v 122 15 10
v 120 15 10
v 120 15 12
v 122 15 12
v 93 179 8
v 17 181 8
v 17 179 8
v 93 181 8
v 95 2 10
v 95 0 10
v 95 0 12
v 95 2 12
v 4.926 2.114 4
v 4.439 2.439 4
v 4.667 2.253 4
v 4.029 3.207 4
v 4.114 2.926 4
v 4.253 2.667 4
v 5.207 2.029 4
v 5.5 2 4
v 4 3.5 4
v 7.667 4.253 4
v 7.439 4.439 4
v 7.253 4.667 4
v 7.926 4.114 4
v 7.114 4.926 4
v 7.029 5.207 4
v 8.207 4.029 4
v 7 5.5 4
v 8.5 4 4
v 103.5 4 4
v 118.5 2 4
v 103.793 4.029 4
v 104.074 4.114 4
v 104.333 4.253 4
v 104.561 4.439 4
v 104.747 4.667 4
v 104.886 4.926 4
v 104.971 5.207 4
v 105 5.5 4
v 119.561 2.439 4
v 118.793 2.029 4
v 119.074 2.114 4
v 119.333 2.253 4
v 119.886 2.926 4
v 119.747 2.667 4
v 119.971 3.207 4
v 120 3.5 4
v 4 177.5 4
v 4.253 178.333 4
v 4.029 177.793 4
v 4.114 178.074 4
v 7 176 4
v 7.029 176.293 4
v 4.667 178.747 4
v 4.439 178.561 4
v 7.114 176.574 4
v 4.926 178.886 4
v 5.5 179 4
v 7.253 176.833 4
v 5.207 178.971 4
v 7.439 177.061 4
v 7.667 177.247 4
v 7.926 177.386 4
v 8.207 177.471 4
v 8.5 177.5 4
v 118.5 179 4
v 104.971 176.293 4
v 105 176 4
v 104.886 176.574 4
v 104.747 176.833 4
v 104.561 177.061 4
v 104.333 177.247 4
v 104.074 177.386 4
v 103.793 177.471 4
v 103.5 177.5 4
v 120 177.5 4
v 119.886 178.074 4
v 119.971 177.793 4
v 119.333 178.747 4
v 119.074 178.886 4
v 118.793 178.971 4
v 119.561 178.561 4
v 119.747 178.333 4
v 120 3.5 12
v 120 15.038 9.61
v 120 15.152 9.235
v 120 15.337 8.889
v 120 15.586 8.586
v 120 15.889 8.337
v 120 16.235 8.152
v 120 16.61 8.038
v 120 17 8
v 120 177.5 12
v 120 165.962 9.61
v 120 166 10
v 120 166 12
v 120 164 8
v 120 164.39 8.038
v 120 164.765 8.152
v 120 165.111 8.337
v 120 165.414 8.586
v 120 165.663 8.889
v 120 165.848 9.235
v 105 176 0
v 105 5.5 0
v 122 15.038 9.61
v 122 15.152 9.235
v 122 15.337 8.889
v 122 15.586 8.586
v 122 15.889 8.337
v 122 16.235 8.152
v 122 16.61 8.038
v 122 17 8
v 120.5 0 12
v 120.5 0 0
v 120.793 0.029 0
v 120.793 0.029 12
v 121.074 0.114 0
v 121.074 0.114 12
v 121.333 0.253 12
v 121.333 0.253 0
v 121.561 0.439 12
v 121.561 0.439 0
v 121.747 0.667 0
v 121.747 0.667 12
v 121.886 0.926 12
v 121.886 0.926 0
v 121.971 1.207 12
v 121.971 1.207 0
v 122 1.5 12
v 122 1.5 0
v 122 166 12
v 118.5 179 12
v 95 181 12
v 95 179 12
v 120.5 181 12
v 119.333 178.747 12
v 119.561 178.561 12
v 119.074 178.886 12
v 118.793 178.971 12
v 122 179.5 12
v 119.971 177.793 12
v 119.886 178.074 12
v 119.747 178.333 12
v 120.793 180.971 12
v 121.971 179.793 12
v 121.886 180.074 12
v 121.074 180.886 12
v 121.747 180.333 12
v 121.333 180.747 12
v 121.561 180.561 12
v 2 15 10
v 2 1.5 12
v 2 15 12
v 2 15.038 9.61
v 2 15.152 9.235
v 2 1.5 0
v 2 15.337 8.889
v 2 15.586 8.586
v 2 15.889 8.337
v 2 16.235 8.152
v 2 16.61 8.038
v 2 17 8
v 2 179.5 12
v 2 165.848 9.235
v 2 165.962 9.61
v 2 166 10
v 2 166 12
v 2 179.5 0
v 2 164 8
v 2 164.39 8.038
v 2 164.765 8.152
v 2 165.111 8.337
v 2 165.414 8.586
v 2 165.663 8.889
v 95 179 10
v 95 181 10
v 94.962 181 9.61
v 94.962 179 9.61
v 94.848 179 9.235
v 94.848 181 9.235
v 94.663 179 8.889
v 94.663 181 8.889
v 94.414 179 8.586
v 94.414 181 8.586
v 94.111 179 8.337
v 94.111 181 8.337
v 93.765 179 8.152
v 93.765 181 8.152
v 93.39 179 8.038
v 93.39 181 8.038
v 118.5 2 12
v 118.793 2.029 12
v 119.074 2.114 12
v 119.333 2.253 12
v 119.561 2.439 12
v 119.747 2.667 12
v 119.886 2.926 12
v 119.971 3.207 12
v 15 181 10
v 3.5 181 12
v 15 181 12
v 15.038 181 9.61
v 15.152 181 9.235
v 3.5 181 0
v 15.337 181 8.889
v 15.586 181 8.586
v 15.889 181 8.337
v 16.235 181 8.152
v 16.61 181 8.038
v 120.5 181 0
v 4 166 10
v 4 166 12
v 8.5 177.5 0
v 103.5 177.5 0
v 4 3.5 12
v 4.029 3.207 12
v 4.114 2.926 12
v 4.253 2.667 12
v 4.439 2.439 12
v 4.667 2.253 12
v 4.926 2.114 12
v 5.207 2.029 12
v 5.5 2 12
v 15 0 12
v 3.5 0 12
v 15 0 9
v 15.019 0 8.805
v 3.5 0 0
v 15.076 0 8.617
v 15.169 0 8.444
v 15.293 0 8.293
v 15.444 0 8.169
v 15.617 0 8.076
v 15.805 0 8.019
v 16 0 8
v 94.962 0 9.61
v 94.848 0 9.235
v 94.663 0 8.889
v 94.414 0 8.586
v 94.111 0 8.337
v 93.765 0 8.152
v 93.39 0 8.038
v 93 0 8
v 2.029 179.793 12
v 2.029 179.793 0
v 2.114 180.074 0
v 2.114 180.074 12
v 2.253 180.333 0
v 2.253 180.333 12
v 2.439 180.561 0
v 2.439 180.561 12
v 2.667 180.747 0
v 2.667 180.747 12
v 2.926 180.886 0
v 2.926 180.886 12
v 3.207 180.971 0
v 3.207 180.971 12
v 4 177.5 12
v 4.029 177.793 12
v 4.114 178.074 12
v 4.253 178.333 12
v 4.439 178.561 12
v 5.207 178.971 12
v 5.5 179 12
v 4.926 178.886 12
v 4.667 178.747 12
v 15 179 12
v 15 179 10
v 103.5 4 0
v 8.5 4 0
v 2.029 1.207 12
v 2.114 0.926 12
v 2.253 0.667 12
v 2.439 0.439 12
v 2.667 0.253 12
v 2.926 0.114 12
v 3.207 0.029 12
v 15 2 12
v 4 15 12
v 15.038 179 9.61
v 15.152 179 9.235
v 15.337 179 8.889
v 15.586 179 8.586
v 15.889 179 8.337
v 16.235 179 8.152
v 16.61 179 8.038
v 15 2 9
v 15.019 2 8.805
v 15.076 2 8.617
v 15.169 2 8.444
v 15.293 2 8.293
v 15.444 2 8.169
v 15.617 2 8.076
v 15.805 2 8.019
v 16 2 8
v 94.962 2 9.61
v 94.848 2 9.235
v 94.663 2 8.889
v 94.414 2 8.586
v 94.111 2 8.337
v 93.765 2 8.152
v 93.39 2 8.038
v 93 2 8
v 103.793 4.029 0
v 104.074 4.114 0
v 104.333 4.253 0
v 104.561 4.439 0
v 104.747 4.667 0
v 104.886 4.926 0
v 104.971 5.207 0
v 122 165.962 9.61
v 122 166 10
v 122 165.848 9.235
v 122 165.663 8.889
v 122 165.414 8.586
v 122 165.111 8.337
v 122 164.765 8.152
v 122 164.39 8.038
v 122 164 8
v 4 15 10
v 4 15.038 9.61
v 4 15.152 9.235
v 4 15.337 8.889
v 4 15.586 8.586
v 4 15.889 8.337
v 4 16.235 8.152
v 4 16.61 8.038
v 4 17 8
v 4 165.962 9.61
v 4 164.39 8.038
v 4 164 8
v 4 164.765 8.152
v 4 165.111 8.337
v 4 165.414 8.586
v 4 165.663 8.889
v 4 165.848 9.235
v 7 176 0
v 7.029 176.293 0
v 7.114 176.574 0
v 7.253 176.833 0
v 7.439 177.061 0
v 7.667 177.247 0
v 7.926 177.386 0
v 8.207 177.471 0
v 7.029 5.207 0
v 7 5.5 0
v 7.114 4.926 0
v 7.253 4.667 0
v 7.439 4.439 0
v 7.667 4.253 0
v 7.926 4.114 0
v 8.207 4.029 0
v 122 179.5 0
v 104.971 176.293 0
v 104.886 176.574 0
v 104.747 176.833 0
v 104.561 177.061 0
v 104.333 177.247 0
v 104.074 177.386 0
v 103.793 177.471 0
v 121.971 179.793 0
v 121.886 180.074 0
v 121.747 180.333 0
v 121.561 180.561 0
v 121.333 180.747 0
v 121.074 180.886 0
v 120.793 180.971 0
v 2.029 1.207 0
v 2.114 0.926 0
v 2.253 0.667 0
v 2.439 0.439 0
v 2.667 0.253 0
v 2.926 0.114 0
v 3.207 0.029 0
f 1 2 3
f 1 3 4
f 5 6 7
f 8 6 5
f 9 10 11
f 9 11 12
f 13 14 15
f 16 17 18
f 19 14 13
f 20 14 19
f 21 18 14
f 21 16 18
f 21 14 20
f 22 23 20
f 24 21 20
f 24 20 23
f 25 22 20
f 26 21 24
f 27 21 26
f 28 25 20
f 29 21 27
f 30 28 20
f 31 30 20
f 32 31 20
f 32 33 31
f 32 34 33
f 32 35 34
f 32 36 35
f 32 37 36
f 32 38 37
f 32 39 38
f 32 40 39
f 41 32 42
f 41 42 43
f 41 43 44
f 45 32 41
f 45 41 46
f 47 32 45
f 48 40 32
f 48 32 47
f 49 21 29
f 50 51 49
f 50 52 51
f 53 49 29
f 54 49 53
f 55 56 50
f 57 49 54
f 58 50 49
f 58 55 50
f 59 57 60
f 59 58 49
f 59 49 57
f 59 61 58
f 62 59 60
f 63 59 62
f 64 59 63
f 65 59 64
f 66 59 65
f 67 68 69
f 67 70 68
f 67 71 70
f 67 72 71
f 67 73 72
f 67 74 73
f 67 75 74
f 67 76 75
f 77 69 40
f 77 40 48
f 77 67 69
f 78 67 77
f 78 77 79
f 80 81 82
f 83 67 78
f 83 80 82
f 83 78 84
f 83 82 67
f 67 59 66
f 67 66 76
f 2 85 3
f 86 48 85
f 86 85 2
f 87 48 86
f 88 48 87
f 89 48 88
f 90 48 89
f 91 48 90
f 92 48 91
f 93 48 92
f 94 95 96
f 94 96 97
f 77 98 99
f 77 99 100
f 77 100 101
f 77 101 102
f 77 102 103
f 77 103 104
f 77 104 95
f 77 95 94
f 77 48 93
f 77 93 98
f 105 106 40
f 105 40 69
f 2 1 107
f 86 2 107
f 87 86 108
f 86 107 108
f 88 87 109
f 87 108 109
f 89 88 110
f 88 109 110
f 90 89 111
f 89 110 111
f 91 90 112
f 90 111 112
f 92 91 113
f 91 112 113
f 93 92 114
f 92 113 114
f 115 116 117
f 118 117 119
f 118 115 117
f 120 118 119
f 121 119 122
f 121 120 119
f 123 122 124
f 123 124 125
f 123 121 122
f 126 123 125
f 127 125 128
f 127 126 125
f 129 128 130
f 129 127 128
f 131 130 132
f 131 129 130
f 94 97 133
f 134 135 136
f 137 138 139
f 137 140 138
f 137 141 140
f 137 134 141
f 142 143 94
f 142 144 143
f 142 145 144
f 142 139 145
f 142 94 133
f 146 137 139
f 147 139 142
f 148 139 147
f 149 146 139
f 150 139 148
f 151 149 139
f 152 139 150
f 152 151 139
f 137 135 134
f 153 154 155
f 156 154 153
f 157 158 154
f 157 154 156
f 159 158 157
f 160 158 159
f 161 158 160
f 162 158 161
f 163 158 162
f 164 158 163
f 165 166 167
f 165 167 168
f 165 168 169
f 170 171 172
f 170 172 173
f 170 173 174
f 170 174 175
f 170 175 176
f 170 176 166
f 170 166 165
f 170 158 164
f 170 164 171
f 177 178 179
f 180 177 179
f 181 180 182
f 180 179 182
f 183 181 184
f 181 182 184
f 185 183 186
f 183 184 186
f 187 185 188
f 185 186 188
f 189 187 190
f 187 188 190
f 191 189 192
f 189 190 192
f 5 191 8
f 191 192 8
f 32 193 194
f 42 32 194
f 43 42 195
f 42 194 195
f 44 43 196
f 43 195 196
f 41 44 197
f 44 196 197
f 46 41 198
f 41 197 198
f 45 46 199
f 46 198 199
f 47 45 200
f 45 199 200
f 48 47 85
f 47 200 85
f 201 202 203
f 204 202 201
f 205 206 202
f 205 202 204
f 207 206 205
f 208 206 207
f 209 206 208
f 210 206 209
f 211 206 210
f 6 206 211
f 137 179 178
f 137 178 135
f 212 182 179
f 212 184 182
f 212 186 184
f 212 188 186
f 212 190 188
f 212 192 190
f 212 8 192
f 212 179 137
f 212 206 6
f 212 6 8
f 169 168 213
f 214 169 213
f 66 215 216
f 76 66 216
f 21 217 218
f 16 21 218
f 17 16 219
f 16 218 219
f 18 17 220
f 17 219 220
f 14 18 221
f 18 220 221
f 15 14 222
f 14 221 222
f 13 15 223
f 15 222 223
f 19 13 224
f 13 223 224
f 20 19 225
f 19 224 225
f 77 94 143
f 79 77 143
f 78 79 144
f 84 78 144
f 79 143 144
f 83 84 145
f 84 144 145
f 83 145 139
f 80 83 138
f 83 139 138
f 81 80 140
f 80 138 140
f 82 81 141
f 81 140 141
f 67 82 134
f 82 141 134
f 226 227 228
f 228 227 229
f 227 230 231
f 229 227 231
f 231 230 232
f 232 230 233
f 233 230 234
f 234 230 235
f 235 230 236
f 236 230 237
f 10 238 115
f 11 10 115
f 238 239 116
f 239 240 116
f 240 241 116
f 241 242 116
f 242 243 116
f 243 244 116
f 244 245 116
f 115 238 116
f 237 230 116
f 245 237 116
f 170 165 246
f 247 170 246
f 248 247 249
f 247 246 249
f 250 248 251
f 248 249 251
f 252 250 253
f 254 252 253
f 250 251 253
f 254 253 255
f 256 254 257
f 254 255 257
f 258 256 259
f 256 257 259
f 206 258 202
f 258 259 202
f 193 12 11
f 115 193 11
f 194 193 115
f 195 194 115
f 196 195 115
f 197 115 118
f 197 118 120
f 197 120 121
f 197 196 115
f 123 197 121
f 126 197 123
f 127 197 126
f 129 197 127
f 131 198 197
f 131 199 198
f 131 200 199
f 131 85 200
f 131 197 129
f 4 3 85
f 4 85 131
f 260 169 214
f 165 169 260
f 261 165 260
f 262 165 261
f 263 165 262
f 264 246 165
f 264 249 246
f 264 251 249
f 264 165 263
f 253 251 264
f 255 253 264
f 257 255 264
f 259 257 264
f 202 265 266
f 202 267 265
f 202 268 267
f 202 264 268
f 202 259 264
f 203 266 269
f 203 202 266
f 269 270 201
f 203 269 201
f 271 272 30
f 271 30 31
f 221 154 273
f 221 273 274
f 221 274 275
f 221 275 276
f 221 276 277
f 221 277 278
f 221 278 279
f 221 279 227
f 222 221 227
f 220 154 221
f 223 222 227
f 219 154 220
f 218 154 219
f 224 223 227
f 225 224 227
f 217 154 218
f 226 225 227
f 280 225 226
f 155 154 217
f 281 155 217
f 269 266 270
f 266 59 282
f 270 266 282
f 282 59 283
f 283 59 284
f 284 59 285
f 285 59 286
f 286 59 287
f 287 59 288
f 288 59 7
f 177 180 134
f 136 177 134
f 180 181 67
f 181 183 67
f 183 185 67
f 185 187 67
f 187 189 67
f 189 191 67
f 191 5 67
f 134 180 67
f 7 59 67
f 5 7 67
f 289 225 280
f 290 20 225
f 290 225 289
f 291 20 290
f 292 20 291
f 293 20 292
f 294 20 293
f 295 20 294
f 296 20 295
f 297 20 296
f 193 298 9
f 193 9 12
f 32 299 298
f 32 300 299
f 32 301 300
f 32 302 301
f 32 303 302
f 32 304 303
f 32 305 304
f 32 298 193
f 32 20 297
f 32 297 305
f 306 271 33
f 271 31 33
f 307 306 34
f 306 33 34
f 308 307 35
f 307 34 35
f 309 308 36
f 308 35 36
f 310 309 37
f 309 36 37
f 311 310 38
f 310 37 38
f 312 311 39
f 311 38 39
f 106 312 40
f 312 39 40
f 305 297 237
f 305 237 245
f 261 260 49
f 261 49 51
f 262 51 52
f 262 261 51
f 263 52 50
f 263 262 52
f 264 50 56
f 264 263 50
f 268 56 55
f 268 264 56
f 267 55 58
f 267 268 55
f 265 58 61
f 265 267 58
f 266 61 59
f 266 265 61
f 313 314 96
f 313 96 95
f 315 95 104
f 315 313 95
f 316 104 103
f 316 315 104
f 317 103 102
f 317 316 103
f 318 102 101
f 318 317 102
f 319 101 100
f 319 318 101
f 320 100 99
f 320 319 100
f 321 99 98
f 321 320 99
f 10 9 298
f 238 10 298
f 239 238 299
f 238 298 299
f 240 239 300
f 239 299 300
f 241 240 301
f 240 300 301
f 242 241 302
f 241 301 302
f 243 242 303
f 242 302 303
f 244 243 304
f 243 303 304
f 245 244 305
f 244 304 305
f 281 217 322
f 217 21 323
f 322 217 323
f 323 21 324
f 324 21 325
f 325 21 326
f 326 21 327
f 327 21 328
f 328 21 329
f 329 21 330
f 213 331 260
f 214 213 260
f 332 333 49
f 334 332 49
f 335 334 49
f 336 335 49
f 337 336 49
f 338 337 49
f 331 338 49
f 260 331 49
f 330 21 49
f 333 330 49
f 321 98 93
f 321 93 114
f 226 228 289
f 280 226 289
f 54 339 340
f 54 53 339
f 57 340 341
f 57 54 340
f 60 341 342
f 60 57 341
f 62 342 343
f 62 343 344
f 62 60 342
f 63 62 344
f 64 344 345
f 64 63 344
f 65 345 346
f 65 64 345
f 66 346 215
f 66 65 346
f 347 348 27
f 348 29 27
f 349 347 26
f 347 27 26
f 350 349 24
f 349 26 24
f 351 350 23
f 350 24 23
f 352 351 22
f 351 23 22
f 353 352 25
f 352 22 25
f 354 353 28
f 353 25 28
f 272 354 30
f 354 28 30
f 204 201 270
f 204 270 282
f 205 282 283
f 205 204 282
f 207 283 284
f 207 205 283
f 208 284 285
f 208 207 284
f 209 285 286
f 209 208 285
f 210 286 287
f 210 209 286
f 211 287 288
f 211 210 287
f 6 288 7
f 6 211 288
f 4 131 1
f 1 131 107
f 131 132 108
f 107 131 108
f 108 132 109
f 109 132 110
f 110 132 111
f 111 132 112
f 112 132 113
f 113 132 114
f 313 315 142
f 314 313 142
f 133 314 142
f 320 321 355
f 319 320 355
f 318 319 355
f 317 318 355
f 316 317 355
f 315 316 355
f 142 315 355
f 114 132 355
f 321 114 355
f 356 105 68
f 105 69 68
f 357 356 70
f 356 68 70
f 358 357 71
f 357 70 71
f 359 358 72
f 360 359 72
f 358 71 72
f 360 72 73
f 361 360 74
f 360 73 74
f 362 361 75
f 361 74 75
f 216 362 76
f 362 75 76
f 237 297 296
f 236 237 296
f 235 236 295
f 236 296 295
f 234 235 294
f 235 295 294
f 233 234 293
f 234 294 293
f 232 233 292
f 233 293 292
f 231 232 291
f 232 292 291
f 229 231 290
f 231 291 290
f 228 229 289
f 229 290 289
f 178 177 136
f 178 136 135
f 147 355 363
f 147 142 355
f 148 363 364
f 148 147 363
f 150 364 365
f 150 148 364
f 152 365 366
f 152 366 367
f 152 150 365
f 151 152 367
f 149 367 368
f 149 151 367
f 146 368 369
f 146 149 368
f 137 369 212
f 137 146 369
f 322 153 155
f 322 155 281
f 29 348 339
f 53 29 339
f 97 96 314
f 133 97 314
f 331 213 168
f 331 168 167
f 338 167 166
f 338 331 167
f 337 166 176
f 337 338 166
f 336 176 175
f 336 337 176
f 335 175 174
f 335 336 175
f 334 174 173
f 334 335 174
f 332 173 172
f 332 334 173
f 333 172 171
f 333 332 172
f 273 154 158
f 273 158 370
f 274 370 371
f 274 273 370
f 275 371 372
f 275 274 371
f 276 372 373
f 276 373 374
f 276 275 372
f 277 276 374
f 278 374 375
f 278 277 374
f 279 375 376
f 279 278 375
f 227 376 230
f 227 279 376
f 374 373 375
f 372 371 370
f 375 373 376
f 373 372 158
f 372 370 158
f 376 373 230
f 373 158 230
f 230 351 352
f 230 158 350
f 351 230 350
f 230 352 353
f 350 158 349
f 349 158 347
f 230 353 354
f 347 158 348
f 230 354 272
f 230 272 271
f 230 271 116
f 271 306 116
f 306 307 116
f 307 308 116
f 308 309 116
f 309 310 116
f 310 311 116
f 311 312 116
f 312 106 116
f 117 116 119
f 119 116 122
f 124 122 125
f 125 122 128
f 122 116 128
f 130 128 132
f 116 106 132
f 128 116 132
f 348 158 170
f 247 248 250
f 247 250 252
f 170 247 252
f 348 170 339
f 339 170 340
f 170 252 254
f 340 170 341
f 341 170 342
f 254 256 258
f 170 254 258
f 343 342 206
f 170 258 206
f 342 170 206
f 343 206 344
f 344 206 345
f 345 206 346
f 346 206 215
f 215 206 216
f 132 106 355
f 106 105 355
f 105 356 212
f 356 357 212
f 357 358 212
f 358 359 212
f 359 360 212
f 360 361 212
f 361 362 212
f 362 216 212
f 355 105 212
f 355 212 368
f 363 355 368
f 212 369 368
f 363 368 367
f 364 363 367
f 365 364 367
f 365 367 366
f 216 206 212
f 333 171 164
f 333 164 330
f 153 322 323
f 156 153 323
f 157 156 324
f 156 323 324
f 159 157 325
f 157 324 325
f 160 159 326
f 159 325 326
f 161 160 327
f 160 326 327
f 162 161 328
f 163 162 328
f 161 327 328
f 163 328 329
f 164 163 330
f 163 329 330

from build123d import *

# Parameters (mm, degrees)
BOX004_W      = 10
BOX004_H      = 151
BOX004_DEPTH  = 10
BOX006_W      = 80
BOX006_H      = 10
BOX006_DEPTH  = 10
BOX005_W      = 10
BOX005_H      = 151
BOX005_DEPTH  = 10
BOX007_W      = 80
BOX007_H      = 10
BOX007_DEPTH  = 10
FILLET004_1_R = 2
FILLET004_2_R = 1
BOX003_W      = 116
BOX003_H      = 177
BOX003_DEPTH  = 10
FILLET002_R   = 1.5
BOX002_W      = 120
BOX002_H      = 181
BOX002_DEPTH  = 8
FILLET003_R   = 1.5
BOX001_W      = 98
BOX001_H      = 173.5
BOX001_DEPTH  = 4
FILLET_R      = 1.5
BOX_W         = 120
BOX_H         = 181
BOX_DEPTH     = 4
FILLET001_R   = 1.5


with BuildPart() as cube004:
    # Box004 → Box004 (new body)
    with BuildSketch(Plane(origin=(115, 15, 0), x_dir=(1, 0, 0), z_dir=(0, 0, 1))):
        with Locations((5, 75.5)):
            Rectangle(BOX004_W, BOX004_H)
    extrude(amount=BOX004_DEPTH)


with BuildPart() as cube006:
    # Box006 → Box006 (new body)
    with BuildSketch(Plane(origin=(15, -5, 0), x_dir=(1, 0, 0), z_dir=(0, 0, 1))):
        with Locations((40, 5)):
            Rectangle(BOX006_W, BOX006_H)
    extrude(amount=BOX006_DEPTH)


with BuildPart() as cube005:
    # Box005 → Box005 (new body)
    with BuildSketch(Plane(origin=(0, 15, 0), x_dir=(1, 0, 0), z_dir=(0, 0, 1))):
        with Locations((5, 75.5)):
            Rectangle(BOX005_W, BOX005_H)
    extrude(amount=BOX005_DEPTH)


with BuildPart() as fillet004:
    # Box007 → Box007 (new body)
    with BuildSketch(Plane(origin=(15, 175, 0), x_dir=(1, 0, 0), z_dir=(0, 0, 1))):
        with Locations((40, 5)):
            Rectangle(BOX007_W, BOX007_H)
    extrude(amount=BOX007_DEPTH)

    # Fusion: union Cube004, Cube006, Cube005
    add(cube004.part)
    add(cube006.part)
    add(cube005.part)


with BuildPart() as fillet004_1:
    # Fusion placement: moved
    add(fillet004.part.moved(Location((0, 0, 8))))

    # Fillet004 1
    fillet004_1_edges = [fillet004_1.edges().sort_by_distance(p)[0] for p in [
        (15, 180, 8),
        (95, 180, 8),
        (120, 15, 8),
        (120, 166, 8),
        (95, 0, 8),
        (5, 15, 8),
        (5, 166, 8),
    ]]
    fillet(fillet004_1_edges, radius=FILLET004_1_R)

    # Fillet004 2
    fillet004_2_edges = [fillet004_1.edges().sort_by_distance(p)[0] for p in [
        (15, 0, 8),
    ]]
    fillet(fillet004_2_edges, radius=FILLET004_2_R)


with BuildPart() as fillet002:
    # Box003 → Box003 (new body)
    with BuildSketch(Plane(origin=(4, 2, 4), x_dir=(1, 0, 0), z_dir=(0, 0, 1))):
        with Locations((58, 88.5)):
            Rectangle(BOX003_W, BOX003_H)
    extrude(amount=BOX003_DEPTH)

    # Fillet002
    fillet002_edges = [fillet002.edges().sort_by_distance(p)[0] for p in [
        (4, 2, 9),
        (4, 179, 9),
        (120, 2, 9),
        (120, 179, 9),
    ]]
    fillet(fillet002_edges, radius=FILLET002_R)


with BuildPart() as cut002:
    # Box002 → Box002 (new body)
    with BuildSketch(Plane(origin=(2, 0, 4), x_dir=(1, 0, 0), z_dir=(0, 0, 1))):
        with Locations((60, 90.5)):
            Rectangle(BOX002_W, BOX002_H)
    extrude(amount=BOX002_DEPTH)

    # Fillet003
    fillet003_edges = [cut002.edges().sort_by_distance(p)[0] for p in [
        (2, 0, 8),
        (2, 181, 8),
        (122, 0, 8),
        (122, 181, 8),
    ]]
    fillet(fillet003_edges, radius=FILLET003_R)

    # Cut001: cut Fillet002
    add(fillet002.part, mode=Mode.SUBTRACT)

    # Cut002: cut Fillet004
    add(fillet004_1.part, mode=Mode.SUBTRACT)


with BuildPart() as fillet_body:
    # Box001 → Box001 (new body)
    with BuildSketch(Plane(origin=(7, 4, 0), x_dir=(1, 0, 0), z_dir=(0, 0, 1))):
        with Locations((49, 86.75)):
            Rectangle(BOX001_W, BOX001_H)
    extrude(amount=BOX001_DEPTH)

    # Fillet
    fillet_edges = [fillet_body.edges().sort_by_distance(p)[0] for p in [
        (7, 4, 2),
        (7, 177.5, 2),
        (105, 4, 2),
        (105, 177.5, 2),
    ]]
    fillet(fillet_edges, radius=FILLET_R)


with BuildPart() as fusion001:
    # Box → Box (new body)
    with BuildSketch(Plane(origin=(2, 0, 0), x_dir=(1, 0, 0), z_dir=(0, 0, 1))):
        with Locations((60, 90.5)):
            Rectangle(BOX_W, BOX_H)
    extrude(amount=BOX_DEPTH)

    # Fillet001
    fillet001_edges = [fusion001.edges().sort_by_distance(p)[0] for p in [
        (2, 0, 2),
        (2, 181, 2),
        (122, 0, 2),
        (122, 181, 2),
    ]]
    fillet(fillet001_edges, radius=FILLET001_R)

    # Cut: cut Fillet body
    add(fillet_body.part, mode=Mode.SUBTRACT)

    # Fusion001: union Cut002
    add(cut002.part)


solid = fusion001.part
